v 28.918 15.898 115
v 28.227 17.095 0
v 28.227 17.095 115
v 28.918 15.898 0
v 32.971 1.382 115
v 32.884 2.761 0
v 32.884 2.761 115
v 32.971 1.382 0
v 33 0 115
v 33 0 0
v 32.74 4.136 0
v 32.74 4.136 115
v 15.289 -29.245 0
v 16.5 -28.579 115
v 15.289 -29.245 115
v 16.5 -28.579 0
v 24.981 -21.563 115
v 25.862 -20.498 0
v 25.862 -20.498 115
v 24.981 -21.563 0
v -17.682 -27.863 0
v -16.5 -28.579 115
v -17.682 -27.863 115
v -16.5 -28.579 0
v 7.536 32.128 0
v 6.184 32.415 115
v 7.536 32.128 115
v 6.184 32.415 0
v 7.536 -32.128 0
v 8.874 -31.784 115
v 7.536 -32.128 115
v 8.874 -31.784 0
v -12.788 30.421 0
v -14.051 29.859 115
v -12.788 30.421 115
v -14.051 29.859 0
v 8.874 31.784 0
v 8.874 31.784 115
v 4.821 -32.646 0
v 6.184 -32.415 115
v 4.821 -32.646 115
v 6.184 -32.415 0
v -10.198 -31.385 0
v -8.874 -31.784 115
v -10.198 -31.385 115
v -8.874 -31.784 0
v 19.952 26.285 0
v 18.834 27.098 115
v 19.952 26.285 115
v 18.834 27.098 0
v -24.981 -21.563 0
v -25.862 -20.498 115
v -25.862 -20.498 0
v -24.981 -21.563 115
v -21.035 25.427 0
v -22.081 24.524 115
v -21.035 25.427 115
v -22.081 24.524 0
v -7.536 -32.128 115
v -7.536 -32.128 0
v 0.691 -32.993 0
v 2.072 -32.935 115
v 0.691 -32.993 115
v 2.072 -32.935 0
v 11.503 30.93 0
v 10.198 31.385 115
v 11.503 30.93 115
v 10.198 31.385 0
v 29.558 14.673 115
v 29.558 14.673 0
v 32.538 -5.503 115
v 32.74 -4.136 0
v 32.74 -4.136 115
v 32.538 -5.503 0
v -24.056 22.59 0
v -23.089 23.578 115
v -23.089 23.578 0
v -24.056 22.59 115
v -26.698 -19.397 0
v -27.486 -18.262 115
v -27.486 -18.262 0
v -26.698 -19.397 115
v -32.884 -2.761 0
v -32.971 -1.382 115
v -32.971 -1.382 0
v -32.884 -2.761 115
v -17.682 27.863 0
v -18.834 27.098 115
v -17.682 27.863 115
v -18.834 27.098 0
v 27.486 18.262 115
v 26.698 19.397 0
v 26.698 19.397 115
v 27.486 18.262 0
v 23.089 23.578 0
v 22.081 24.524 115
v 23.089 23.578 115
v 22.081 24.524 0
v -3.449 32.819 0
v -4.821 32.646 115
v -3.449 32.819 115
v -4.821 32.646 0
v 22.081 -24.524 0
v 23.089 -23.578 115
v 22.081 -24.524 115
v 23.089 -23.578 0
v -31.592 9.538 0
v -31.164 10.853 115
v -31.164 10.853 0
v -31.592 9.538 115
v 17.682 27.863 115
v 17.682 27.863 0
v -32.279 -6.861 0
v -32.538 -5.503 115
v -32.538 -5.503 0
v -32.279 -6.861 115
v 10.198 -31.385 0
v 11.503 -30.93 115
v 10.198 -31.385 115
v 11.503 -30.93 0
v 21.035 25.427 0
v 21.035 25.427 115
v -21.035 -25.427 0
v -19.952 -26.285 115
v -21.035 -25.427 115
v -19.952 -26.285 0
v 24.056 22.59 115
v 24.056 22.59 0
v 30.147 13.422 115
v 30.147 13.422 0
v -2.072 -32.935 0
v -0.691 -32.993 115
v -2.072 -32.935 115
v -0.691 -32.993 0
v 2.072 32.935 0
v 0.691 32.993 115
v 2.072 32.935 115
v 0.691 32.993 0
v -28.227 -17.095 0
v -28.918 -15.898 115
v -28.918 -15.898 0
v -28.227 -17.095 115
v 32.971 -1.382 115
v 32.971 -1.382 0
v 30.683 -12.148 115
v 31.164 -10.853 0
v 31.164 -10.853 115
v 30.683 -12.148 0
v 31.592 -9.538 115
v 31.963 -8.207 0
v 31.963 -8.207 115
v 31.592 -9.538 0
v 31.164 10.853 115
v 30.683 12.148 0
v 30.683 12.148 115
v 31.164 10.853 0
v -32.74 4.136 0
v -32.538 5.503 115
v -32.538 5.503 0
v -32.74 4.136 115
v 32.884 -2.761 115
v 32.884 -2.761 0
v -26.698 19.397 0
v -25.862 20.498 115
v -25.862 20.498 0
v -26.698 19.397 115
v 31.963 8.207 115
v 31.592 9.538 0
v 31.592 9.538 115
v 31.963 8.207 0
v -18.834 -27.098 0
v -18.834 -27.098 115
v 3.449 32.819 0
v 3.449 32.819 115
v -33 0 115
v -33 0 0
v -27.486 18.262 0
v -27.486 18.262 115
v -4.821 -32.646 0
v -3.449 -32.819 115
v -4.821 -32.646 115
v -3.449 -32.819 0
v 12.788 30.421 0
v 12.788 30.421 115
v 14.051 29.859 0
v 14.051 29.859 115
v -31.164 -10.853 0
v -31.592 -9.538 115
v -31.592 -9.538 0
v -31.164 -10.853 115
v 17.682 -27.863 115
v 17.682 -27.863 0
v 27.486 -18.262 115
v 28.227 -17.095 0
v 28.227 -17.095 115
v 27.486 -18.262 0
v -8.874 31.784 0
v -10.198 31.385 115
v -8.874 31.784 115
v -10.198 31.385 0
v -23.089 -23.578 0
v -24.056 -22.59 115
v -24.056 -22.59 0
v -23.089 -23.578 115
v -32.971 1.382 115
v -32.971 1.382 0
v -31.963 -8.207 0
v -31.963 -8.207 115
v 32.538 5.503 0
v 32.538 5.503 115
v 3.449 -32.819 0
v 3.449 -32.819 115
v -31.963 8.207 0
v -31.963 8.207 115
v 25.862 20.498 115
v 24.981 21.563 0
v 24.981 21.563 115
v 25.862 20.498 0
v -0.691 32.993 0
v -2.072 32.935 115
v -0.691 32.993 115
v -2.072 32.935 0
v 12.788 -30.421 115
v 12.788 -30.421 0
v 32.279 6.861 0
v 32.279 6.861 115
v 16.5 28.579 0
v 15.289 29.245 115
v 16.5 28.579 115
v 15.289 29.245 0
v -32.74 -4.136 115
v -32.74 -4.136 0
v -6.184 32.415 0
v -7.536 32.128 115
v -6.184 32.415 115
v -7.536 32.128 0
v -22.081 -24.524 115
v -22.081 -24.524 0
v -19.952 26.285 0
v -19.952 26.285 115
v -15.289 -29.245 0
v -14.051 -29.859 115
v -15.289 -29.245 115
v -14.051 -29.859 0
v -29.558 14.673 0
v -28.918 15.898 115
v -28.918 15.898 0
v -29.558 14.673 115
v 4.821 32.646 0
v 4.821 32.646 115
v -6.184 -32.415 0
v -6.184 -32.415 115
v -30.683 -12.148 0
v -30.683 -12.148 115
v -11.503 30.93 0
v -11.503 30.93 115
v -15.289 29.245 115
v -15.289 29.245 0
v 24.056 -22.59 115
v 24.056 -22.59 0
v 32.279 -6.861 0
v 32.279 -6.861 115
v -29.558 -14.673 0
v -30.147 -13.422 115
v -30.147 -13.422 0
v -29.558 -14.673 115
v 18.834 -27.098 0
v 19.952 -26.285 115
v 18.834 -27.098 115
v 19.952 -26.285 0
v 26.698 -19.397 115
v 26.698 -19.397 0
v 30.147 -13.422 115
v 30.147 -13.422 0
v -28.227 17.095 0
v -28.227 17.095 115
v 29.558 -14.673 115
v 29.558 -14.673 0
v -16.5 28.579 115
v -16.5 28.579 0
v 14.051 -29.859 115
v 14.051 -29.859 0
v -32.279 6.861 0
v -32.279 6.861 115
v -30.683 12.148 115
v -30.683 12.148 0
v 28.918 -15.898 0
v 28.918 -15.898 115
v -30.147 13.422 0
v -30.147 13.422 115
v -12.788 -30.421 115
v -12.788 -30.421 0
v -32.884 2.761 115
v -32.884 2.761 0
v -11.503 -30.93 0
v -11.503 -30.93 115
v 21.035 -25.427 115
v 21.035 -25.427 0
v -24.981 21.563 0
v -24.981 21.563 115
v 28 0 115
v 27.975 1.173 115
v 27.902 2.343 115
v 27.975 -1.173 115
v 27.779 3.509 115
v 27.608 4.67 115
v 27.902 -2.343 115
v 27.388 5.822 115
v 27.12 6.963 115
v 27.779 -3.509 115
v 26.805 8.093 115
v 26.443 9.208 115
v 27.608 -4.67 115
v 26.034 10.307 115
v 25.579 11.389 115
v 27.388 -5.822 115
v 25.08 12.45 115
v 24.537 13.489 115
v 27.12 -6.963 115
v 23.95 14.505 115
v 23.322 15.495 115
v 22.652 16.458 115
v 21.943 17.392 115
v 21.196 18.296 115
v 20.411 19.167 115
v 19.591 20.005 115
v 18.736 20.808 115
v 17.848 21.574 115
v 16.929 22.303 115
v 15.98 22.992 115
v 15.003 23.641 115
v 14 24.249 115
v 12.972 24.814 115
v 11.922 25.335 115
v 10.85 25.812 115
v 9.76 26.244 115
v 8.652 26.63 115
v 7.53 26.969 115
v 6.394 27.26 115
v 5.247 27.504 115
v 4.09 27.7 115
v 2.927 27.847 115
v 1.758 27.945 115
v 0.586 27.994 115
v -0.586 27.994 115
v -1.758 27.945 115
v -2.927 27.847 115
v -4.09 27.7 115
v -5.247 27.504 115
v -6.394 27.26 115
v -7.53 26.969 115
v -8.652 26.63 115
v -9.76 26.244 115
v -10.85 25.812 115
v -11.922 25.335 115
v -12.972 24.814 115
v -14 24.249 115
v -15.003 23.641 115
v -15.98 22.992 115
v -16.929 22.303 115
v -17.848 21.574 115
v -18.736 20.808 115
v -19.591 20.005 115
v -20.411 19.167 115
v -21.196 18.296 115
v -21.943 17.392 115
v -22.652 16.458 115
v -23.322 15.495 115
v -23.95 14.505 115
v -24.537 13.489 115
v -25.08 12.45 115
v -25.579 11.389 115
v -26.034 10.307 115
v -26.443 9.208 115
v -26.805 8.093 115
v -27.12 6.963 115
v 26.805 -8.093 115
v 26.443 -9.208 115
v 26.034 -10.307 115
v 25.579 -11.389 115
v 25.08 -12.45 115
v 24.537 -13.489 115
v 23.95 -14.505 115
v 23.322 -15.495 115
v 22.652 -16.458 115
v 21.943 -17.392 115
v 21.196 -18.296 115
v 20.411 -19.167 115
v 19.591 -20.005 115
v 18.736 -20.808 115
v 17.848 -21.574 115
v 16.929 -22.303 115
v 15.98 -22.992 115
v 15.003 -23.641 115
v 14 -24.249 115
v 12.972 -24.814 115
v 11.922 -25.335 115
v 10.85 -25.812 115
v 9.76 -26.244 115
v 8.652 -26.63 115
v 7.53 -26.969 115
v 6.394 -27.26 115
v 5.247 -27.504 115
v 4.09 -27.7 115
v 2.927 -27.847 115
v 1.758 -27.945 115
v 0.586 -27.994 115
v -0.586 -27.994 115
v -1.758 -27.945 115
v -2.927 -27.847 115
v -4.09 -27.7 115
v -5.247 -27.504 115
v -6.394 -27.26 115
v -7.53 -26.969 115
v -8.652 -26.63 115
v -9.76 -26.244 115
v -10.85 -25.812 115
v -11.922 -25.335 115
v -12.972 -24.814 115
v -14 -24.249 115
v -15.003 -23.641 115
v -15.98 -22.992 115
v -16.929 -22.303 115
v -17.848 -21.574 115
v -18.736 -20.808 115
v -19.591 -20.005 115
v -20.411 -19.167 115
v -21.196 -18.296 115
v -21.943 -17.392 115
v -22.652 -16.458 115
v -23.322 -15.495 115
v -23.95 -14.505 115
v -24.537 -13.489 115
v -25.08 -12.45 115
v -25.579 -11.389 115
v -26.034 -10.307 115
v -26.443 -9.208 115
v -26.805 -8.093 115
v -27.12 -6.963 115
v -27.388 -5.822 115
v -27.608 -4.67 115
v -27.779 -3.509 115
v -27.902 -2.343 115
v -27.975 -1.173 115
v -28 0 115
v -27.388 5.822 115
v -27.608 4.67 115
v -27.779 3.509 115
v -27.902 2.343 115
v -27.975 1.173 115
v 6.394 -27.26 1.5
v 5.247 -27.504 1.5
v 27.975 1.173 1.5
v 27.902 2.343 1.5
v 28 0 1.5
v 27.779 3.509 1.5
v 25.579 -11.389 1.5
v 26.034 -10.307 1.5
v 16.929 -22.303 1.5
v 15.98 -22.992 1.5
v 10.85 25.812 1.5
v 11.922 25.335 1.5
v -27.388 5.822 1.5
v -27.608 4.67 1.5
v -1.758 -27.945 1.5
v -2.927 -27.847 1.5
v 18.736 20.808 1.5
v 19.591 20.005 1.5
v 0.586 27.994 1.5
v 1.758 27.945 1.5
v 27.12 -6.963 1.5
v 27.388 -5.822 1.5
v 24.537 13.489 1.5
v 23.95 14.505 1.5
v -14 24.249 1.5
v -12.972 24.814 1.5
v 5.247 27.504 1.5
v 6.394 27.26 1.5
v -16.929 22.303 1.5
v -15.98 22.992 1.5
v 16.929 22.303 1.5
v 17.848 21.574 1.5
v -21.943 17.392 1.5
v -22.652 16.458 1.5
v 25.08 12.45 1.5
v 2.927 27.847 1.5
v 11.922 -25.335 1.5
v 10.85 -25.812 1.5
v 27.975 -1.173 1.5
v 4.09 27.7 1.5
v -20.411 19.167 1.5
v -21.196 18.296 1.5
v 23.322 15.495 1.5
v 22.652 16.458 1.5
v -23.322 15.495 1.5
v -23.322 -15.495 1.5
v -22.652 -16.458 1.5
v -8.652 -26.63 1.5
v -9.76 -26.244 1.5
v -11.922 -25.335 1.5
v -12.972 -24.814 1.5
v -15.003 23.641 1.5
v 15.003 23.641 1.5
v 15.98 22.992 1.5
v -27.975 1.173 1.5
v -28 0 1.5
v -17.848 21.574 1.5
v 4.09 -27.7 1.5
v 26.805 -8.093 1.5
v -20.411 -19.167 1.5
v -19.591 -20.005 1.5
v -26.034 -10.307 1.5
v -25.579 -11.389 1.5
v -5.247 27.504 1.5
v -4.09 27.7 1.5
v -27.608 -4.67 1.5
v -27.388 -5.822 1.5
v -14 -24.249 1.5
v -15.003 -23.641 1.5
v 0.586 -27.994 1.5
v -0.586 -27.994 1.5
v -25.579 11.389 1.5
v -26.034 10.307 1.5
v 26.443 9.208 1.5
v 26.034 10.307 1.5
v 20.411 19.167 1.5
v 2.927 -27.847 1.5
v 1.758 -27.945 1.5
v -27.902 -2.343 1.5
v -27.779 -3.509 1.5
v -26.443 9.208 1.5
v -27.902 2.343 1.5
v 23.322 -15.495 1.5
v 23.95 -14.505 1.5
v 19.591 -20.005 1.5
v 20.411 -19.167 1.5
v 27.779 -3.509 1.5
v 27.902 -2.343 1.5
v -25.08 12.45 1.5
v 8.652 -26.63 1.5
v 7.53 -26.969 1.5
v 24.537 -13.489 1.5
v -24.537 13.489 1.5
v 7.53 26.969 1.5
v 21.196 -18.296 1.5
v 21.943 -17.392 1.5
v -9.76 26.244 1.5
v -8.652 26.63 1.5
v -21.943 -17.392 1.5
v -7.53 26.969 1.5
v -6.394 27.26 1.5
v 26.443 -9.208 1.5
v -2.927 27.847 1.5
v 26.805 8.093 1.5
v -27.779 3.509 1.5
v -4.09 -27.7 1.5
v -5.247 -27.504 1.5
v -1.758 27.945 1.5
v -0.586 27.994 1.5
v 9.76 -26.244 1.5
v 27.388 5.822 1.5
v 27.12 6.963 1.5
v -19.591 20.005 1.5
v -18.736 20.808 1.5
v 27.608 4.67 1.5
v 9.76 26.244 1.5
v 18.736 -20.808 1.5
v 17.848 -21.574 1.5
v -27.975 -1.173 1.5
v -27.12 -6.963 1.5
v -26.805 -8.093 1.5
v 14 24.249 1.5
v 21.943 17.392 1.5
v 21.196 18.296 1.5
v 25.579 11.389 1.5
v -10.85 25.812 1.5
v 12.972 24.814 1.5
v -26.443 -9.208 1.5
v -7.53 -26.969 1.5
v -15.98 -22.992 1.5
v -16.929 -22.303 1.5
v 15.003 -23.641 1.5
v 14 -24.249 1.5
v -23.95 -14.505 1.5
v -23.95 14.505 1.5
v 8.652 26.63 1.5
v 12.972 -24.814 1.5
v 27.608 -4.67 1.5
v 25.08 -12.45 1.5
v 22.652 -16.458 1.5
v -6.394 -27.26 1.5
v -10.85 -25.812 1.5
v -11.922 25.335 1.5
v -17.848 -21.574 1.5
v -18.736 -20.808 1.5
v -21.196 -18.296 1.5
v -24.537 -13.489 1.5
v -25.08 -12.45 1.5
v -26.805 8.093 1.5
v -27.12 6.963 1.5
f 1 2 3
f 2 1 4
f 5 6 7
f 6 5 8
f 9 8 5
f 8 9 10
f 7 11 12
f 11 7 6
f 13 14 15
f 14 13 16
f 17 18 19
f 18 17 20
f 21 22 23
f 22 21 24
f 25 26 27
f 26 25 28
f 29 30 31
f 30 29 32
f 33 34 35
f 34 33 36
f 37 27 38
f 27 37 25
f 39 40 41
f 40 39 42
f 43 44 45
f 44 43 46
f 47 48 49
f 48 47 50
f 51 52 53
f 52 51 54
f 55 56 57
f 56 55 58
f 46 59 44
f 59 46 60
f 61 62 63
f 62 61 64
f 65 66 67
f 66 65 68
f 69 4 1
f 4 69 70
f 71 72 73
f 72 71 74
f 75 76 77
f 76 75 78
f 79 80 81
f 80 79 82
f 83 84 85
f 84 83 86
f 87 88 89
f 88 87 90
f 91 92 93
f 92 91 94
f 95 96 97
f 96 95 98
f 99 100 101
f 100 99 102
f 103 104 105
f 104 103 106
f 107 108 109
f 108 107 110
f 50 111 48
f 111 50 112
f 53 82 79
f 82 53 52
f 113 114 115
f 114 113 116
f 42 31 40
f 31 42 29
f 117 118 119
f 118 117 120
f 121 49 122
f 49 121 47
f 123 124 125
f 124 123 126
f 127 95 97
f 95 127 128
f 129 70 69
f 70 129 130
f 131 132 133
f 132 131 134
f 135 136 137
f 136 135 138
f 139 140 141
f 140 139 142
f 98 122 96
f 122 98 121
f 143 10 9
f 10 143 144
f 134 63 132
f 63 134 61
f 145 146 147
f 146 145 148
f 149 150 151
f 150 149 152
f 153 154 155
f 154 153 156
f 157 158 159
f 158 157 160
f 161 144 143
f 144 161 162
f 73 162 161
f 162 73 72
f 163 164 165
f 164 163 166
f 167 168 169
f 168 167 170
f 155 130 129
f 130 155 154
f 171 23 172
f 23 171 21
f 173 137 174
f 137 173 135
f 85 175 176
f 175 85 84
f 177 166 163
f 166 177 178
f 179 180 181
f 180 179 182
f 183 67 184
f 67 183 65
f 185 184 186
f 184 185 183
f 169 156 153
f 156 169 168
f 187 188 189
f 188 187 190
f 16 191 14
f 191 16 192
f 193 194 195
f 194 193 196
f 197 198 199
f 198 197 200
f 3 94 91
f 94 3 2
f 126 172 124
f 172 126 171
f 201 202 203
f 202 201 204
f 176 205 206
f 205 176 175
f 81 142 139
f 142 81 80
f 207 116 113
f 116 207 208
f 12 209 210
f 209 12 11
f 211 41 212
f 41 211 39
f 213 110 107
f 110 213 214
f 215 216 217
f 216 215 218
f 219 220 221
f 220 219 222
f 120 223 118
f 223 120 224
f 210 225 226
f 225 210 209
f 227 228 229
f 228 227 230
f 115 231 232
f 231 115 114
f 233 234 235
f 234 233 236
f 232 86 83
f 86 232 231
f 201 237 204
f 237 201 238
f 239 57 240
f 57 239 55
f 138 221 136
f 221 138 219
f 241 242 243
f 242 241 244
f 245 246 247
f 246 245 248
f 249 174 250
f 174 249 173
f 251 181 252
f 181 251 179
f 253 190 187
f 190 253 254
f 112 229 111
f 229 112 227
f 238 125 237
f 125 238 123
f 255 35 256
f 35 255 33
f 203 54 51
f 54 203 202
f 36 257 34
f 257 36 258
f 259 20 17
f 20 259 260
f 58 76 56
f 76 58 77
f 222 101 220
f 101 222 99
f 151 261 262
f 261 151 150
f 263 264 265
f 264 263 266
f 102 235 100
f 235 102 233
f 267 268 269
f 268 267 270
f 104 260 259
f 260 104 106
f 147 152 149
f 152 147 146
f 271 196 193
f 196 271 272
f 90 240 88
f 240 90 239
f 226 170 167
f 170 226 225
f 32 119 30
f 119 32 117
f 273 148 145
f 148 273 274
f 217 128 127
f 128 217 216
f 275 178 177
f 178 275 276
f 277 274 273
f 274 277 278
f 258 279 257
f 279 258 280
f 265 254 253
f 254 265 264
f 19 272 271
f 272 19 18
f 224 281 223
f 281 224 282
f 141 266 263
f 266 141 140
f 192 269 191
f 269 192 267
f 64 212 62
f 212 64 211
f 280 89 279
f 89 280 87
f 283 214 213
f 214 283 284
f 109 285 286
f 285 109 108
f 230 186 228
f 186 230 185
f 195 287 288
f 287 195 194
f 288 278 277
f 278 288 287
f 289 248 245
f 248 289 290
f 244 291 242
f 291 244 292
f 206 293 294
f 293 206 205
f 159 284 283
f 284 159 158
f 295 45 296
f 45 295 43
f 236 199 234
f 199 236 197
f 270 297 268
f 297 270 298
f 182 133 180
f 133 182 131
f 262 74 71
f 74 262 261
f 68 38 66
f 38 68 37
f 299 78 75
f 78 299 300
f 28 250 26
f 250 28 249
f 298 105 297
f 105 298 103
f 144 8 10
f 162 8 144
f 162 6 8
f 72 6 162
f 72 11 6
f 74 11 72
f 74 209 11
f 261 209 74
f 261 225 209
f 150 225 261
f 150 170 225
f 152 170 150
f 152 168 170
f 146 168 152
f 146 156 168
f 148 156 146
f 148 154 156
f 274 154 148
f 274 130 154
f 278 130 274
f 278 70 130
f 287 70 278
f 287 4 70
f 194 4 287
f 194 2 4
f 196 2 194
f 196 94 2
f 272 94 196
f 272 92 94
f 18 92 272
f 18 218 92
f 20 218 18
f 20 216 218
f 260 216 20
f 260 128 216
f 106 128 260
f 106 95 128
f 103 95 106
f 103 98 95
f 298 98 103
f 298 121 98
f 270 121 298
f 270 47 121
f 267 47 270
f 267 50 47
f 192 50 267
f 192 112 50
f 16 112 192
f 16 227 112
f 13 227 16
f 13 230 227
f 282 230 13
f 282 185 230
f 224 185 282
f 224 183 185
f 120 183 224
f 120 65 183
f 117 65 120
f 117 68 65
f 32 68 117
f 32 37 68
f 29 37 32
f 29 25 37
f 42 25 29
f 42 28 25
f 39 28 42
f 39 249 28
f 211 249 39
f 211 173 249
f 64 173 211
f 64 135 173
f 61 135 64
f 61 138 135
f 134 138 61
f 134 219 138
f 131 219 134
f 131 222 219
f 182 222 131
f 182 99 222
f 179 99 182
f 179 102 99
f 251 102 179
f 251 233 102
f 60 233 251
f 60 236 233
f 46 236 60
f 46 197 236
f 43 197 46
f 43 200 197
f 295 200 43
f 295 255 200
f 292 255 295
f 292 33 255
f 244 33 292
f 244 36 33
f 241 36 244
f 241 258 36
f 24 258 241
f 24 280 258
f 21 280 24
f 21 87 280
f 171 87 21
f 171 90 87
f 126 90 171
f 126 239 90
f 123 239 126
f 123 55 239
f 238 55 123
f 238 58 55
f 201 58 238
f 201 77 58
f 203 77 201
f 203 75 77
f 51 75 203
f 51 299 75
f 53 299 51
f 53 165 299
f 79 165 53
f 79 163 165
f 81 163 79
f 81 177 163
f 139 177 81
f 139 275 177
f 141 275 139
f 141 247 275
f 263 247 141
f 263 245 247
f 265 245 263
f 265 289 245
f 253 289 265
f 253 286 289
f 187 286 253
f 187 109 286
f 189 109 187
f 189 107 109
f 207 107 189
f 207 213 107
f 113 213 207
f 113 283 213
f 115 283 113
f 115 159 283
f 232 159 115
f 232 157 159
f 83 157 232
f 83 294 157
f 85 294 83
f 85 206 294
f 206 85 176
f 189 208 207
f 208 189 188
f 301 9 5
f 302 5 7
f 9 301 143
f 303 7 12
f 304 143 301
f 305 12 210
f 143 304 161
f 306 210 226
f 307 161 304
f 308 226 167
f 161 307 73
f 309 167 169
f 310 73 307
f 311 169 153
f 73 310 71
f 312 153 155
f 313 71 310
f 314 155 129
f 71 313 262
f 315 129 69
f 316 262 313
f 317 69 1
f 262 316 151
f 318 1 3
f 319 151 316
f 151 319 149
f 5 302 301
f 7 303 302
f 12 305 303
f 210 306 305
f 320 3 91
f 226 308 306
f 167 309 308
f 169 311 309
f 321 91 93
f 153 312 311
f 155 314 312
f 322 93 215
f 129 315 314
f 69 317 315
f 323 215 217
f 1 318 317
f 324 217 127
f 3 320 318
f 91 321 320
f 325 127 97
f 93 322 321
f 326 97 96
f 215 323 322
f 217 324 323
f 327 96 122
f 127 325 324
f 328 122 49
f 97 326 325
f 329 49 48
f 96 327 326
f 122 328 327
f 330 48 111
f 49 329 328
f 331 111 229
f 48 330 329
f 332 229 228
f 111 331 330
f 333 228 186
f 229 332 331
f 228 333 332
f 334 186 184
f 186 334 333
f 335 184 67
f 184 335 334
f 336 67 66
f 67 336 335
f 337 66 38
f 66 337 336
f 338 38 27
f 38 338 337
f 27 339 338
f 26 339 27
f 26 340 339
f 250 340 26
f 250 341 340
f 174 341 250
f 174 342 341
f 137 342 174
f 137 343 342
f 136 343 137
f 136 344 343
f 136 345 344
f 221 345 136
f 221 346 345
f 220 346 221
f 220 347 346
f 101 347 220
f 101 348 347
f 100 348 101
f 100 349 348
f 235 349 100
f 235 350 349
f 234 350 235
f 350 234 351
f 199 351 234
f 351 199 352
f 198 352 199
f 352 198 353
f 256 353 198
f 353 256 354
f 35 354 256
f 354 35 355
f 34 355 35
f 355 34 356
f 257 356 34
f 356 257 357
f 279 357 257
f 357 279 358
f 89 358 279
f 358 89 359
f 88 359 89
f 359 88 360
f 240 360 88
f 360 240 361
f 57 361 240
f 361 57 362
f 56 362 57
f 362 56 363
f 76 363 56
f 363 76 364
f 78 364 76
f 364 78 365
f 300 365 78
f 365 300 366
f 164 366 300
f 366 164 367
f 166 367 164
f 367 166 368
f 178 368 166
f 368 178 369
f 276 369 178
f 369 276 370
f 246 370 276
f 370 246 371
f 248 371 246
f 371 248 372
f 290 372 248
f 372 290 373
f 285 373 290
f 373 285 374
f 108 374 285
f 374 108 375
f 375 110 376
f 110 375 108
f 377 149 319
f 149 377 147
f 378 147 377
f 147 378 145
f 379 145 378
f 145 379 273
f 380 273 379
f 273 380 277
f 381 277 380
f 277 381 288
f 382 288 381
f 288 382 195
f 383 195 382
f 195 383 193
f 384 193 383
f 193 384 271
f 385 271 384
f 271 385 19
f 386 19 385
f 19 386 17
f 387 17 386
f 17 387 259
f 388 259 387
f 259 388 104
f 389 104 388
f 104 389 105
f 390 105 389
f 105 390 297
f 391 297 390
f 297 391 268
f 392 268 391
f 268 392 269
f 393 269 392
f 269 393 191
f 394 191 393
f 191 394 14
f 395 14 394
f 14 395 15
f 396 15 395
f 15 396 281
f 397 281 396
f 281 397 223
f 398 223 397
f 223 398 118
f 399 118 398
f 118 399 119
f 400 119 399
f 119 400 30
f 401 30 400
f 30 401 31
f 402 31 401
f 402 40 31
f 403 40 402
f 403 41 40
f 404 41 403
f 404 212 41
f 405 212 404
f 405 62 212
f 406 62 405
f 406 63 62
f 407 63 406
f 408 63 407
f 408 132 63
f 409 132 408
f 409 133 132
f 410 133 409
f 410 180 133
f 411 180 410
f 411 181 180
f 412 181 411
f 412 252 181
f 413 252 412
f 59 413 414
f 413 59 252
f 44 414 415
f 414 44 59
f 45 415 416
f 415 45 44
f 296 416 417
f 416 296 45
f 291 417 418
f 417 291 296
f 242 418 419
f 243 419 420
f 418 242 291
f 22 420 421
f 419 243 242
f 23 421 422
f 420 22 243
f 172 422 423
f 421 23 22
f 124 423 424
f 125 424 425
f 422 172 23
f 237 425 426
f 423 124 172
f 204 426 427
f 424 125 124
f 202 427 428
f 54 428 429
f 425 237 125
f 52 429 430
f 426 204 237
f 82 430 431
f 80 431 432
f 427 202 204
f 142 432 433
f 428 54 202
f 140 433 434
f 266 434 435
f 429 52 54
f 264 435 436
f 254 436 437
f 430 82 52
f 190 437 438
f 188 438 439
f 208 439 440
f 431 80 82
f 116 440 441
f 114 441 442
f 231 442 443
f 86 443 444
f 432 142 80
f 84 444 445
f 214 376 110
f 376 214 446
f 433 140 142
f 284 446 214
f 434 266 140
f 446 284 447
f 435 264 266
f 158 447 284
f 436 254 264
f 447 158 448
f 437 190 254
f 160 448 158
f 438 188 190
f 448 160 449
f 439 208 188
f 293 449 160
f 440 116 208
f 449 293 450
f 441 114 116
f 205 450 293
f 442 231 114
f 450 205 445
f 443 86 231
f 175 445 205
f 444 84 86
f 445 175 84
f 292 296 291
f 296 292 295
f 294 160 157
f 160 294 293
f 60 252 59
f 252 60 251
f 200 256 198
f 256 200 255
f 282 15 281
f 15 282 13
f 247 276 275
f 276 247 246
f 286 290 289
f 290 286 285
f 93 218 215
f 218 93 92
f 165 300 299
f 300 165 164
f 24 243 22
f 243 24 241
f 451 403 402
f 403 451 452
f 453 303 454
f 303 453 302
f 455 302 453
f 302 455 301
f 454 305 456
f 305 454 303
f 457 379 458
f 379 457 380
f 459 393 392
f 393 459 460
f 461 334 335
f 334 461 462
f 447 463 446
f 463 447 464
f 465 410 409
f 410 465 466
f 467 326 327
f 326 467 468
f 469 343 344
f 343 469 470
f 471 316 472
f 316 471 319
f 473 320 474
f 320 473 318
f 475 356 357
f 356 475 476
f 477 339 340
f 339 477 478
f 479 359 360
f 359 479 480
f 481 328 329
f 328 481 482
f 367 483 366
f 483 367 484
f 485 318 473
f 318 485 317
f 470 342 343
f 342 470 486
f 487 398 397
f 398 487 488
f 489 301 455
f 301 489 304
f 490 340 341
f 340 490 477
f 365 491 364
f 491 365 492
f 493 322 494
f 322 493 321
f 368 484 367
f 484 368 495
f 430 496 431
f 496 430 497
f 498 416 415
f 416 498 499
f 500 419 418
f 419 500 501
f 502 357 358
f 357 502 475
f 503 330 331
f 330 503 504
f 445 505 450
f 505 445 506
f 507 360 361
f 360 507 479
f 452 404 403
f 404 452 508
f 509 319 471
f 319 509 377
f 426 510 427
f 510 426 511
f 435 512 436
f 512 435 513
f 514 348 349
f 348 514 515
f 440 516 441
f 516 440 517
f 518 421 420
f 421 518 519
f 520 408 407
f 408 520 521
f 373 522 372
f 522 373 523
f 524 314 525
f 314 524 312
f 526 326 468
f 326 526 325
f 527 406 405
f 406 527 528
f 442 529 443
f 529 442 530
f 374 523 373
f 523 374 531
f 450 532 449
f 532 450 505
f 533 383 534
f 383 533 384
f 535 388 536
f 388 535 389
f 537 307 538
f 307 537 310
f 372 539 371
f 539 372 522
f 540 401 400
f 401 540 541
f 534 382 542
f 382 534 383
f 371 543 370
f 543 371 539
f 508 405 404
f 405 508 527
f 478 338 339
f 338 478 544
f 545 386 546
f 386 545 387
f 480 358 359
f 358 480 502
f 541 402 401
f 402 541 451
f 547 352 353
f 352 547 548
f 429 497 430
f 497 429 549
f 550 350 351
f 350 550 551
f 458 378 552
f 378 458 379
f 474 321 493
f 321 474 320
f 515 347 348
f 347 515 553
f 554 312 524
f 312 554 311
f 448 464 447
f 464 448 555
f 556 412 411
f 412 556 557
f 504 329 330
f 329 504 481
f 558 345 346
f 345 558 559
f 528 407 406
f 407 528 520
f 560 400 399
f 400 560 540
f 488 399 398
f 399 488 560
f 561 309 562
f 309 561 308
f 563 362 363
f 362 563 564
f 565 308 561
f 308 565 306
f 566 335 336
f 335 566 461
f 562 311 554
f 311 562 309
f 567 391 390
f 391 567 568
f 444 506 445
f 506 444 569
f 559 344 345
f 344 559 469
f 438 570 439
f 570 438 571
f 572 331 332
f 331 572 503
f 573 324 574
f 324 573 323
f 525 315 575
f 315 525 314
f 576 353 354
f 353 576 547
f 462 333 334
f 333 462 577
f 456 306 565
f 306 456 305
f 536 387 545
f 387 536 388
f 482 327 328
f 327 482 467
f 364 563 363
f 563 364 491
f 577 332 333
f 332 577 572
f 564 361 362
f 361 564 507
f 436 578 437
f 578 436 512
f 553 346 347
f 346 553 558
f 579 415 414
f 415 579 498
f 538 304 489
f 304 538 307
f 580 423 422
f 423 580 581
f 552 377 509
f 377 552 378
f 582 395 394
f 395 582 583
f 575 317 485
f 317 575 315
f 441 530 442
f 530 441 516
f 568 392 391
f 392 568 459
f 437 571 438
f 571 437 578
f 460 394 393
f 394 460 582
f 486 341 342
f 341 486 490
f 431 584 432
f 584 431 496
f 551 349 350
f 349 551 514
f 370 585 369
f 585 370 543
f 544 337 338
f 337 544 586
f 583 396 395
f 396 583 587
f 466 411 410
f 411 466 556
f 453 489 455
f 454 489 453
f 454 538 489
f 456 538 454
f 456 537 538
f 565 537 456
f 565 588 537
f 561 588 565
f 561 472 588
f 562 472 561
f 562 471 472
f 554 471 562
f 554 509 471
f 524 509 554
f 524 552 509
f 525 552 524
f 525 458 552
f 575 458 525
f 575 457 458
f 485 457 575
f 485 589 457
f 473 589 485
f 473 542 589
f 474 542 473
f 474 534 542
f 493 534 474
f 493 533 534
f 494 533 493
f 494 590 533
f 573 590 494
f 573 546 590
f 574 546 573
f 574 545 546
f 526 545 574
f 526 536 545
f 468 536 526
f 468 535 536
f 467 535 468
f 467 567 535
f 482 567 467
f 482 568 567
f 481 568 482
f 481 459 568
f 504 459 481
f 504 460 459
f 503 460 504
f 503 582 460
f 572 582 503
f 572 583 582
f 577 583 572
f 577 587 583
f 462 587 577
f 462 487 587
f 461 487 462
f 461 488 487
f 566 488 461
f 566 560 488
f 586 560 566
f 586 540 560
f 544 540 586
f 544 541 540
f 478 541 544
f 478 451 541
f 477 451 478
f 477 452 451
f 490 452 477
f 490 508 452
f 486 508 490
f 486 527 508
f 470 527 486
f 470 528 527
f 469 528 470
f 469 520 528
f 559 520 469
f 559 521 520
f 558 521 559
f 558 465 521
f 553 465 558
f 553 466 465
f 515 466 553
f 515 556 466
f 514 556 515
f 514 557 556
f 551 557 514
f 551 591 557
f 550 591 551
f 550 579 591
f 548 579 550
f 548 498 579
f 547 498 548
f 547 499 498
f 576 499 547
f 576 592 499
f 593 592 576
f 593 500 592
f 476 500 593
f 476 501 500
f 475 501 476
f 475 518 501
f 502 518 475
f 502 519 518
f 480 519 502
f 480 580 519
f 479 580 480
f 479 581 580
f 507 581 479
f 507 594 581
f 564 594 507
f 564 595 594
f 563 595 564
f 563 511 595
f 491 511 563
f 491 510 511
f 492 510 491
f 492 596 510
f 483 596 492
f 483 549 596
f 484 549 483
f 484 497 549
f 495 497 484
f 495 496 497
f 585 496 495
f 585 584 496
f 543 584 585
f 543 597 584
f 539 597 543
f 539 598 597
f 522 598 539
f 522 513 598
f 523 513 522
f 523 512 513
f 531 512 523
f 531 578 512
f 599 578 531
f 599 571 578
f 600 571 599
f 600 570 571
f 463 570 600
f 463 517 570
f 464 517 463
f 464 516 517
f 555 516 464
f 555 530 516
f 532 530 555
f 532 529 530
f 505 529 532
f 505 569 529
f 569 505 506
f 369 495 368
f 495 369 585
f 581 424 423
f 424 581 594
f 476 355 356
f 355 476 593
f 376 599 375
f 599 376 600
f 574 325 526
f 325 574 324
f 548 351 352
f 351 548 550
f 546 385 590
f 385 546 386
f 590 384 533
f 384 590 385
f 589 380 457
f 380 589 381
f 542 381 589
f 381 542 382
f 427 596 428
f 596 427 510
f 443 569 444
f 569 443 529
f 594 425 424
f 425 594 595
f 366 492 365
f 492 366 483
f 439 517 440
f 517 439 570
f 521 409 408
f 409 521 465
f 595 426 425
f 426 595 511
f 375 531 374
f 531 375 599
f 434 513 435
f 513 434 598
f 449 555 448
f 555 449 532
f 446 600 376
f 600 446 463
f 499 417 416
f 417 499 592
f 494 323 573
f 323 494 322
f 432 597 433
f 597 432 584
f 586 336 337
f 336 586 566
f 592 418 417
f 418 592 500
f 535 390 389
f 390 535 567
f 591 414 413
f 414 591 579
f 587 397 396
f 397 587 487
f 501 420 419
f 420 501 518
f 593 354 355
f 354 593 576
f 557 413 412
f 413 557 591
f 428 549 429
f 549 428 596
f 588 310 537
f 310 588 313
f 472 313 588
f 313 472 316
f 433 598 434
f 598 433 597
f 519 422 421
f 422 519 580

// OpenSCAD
$fn = 150;

prumer = 66;
vyska = 115;

rotate([0, 0, 0])
{difference()
{
    cylinder(d = prumer, h = vyska);
    translate([0, 0, 1.5]) cylinder(d = prumer - 10, h = vyska);
}
}
